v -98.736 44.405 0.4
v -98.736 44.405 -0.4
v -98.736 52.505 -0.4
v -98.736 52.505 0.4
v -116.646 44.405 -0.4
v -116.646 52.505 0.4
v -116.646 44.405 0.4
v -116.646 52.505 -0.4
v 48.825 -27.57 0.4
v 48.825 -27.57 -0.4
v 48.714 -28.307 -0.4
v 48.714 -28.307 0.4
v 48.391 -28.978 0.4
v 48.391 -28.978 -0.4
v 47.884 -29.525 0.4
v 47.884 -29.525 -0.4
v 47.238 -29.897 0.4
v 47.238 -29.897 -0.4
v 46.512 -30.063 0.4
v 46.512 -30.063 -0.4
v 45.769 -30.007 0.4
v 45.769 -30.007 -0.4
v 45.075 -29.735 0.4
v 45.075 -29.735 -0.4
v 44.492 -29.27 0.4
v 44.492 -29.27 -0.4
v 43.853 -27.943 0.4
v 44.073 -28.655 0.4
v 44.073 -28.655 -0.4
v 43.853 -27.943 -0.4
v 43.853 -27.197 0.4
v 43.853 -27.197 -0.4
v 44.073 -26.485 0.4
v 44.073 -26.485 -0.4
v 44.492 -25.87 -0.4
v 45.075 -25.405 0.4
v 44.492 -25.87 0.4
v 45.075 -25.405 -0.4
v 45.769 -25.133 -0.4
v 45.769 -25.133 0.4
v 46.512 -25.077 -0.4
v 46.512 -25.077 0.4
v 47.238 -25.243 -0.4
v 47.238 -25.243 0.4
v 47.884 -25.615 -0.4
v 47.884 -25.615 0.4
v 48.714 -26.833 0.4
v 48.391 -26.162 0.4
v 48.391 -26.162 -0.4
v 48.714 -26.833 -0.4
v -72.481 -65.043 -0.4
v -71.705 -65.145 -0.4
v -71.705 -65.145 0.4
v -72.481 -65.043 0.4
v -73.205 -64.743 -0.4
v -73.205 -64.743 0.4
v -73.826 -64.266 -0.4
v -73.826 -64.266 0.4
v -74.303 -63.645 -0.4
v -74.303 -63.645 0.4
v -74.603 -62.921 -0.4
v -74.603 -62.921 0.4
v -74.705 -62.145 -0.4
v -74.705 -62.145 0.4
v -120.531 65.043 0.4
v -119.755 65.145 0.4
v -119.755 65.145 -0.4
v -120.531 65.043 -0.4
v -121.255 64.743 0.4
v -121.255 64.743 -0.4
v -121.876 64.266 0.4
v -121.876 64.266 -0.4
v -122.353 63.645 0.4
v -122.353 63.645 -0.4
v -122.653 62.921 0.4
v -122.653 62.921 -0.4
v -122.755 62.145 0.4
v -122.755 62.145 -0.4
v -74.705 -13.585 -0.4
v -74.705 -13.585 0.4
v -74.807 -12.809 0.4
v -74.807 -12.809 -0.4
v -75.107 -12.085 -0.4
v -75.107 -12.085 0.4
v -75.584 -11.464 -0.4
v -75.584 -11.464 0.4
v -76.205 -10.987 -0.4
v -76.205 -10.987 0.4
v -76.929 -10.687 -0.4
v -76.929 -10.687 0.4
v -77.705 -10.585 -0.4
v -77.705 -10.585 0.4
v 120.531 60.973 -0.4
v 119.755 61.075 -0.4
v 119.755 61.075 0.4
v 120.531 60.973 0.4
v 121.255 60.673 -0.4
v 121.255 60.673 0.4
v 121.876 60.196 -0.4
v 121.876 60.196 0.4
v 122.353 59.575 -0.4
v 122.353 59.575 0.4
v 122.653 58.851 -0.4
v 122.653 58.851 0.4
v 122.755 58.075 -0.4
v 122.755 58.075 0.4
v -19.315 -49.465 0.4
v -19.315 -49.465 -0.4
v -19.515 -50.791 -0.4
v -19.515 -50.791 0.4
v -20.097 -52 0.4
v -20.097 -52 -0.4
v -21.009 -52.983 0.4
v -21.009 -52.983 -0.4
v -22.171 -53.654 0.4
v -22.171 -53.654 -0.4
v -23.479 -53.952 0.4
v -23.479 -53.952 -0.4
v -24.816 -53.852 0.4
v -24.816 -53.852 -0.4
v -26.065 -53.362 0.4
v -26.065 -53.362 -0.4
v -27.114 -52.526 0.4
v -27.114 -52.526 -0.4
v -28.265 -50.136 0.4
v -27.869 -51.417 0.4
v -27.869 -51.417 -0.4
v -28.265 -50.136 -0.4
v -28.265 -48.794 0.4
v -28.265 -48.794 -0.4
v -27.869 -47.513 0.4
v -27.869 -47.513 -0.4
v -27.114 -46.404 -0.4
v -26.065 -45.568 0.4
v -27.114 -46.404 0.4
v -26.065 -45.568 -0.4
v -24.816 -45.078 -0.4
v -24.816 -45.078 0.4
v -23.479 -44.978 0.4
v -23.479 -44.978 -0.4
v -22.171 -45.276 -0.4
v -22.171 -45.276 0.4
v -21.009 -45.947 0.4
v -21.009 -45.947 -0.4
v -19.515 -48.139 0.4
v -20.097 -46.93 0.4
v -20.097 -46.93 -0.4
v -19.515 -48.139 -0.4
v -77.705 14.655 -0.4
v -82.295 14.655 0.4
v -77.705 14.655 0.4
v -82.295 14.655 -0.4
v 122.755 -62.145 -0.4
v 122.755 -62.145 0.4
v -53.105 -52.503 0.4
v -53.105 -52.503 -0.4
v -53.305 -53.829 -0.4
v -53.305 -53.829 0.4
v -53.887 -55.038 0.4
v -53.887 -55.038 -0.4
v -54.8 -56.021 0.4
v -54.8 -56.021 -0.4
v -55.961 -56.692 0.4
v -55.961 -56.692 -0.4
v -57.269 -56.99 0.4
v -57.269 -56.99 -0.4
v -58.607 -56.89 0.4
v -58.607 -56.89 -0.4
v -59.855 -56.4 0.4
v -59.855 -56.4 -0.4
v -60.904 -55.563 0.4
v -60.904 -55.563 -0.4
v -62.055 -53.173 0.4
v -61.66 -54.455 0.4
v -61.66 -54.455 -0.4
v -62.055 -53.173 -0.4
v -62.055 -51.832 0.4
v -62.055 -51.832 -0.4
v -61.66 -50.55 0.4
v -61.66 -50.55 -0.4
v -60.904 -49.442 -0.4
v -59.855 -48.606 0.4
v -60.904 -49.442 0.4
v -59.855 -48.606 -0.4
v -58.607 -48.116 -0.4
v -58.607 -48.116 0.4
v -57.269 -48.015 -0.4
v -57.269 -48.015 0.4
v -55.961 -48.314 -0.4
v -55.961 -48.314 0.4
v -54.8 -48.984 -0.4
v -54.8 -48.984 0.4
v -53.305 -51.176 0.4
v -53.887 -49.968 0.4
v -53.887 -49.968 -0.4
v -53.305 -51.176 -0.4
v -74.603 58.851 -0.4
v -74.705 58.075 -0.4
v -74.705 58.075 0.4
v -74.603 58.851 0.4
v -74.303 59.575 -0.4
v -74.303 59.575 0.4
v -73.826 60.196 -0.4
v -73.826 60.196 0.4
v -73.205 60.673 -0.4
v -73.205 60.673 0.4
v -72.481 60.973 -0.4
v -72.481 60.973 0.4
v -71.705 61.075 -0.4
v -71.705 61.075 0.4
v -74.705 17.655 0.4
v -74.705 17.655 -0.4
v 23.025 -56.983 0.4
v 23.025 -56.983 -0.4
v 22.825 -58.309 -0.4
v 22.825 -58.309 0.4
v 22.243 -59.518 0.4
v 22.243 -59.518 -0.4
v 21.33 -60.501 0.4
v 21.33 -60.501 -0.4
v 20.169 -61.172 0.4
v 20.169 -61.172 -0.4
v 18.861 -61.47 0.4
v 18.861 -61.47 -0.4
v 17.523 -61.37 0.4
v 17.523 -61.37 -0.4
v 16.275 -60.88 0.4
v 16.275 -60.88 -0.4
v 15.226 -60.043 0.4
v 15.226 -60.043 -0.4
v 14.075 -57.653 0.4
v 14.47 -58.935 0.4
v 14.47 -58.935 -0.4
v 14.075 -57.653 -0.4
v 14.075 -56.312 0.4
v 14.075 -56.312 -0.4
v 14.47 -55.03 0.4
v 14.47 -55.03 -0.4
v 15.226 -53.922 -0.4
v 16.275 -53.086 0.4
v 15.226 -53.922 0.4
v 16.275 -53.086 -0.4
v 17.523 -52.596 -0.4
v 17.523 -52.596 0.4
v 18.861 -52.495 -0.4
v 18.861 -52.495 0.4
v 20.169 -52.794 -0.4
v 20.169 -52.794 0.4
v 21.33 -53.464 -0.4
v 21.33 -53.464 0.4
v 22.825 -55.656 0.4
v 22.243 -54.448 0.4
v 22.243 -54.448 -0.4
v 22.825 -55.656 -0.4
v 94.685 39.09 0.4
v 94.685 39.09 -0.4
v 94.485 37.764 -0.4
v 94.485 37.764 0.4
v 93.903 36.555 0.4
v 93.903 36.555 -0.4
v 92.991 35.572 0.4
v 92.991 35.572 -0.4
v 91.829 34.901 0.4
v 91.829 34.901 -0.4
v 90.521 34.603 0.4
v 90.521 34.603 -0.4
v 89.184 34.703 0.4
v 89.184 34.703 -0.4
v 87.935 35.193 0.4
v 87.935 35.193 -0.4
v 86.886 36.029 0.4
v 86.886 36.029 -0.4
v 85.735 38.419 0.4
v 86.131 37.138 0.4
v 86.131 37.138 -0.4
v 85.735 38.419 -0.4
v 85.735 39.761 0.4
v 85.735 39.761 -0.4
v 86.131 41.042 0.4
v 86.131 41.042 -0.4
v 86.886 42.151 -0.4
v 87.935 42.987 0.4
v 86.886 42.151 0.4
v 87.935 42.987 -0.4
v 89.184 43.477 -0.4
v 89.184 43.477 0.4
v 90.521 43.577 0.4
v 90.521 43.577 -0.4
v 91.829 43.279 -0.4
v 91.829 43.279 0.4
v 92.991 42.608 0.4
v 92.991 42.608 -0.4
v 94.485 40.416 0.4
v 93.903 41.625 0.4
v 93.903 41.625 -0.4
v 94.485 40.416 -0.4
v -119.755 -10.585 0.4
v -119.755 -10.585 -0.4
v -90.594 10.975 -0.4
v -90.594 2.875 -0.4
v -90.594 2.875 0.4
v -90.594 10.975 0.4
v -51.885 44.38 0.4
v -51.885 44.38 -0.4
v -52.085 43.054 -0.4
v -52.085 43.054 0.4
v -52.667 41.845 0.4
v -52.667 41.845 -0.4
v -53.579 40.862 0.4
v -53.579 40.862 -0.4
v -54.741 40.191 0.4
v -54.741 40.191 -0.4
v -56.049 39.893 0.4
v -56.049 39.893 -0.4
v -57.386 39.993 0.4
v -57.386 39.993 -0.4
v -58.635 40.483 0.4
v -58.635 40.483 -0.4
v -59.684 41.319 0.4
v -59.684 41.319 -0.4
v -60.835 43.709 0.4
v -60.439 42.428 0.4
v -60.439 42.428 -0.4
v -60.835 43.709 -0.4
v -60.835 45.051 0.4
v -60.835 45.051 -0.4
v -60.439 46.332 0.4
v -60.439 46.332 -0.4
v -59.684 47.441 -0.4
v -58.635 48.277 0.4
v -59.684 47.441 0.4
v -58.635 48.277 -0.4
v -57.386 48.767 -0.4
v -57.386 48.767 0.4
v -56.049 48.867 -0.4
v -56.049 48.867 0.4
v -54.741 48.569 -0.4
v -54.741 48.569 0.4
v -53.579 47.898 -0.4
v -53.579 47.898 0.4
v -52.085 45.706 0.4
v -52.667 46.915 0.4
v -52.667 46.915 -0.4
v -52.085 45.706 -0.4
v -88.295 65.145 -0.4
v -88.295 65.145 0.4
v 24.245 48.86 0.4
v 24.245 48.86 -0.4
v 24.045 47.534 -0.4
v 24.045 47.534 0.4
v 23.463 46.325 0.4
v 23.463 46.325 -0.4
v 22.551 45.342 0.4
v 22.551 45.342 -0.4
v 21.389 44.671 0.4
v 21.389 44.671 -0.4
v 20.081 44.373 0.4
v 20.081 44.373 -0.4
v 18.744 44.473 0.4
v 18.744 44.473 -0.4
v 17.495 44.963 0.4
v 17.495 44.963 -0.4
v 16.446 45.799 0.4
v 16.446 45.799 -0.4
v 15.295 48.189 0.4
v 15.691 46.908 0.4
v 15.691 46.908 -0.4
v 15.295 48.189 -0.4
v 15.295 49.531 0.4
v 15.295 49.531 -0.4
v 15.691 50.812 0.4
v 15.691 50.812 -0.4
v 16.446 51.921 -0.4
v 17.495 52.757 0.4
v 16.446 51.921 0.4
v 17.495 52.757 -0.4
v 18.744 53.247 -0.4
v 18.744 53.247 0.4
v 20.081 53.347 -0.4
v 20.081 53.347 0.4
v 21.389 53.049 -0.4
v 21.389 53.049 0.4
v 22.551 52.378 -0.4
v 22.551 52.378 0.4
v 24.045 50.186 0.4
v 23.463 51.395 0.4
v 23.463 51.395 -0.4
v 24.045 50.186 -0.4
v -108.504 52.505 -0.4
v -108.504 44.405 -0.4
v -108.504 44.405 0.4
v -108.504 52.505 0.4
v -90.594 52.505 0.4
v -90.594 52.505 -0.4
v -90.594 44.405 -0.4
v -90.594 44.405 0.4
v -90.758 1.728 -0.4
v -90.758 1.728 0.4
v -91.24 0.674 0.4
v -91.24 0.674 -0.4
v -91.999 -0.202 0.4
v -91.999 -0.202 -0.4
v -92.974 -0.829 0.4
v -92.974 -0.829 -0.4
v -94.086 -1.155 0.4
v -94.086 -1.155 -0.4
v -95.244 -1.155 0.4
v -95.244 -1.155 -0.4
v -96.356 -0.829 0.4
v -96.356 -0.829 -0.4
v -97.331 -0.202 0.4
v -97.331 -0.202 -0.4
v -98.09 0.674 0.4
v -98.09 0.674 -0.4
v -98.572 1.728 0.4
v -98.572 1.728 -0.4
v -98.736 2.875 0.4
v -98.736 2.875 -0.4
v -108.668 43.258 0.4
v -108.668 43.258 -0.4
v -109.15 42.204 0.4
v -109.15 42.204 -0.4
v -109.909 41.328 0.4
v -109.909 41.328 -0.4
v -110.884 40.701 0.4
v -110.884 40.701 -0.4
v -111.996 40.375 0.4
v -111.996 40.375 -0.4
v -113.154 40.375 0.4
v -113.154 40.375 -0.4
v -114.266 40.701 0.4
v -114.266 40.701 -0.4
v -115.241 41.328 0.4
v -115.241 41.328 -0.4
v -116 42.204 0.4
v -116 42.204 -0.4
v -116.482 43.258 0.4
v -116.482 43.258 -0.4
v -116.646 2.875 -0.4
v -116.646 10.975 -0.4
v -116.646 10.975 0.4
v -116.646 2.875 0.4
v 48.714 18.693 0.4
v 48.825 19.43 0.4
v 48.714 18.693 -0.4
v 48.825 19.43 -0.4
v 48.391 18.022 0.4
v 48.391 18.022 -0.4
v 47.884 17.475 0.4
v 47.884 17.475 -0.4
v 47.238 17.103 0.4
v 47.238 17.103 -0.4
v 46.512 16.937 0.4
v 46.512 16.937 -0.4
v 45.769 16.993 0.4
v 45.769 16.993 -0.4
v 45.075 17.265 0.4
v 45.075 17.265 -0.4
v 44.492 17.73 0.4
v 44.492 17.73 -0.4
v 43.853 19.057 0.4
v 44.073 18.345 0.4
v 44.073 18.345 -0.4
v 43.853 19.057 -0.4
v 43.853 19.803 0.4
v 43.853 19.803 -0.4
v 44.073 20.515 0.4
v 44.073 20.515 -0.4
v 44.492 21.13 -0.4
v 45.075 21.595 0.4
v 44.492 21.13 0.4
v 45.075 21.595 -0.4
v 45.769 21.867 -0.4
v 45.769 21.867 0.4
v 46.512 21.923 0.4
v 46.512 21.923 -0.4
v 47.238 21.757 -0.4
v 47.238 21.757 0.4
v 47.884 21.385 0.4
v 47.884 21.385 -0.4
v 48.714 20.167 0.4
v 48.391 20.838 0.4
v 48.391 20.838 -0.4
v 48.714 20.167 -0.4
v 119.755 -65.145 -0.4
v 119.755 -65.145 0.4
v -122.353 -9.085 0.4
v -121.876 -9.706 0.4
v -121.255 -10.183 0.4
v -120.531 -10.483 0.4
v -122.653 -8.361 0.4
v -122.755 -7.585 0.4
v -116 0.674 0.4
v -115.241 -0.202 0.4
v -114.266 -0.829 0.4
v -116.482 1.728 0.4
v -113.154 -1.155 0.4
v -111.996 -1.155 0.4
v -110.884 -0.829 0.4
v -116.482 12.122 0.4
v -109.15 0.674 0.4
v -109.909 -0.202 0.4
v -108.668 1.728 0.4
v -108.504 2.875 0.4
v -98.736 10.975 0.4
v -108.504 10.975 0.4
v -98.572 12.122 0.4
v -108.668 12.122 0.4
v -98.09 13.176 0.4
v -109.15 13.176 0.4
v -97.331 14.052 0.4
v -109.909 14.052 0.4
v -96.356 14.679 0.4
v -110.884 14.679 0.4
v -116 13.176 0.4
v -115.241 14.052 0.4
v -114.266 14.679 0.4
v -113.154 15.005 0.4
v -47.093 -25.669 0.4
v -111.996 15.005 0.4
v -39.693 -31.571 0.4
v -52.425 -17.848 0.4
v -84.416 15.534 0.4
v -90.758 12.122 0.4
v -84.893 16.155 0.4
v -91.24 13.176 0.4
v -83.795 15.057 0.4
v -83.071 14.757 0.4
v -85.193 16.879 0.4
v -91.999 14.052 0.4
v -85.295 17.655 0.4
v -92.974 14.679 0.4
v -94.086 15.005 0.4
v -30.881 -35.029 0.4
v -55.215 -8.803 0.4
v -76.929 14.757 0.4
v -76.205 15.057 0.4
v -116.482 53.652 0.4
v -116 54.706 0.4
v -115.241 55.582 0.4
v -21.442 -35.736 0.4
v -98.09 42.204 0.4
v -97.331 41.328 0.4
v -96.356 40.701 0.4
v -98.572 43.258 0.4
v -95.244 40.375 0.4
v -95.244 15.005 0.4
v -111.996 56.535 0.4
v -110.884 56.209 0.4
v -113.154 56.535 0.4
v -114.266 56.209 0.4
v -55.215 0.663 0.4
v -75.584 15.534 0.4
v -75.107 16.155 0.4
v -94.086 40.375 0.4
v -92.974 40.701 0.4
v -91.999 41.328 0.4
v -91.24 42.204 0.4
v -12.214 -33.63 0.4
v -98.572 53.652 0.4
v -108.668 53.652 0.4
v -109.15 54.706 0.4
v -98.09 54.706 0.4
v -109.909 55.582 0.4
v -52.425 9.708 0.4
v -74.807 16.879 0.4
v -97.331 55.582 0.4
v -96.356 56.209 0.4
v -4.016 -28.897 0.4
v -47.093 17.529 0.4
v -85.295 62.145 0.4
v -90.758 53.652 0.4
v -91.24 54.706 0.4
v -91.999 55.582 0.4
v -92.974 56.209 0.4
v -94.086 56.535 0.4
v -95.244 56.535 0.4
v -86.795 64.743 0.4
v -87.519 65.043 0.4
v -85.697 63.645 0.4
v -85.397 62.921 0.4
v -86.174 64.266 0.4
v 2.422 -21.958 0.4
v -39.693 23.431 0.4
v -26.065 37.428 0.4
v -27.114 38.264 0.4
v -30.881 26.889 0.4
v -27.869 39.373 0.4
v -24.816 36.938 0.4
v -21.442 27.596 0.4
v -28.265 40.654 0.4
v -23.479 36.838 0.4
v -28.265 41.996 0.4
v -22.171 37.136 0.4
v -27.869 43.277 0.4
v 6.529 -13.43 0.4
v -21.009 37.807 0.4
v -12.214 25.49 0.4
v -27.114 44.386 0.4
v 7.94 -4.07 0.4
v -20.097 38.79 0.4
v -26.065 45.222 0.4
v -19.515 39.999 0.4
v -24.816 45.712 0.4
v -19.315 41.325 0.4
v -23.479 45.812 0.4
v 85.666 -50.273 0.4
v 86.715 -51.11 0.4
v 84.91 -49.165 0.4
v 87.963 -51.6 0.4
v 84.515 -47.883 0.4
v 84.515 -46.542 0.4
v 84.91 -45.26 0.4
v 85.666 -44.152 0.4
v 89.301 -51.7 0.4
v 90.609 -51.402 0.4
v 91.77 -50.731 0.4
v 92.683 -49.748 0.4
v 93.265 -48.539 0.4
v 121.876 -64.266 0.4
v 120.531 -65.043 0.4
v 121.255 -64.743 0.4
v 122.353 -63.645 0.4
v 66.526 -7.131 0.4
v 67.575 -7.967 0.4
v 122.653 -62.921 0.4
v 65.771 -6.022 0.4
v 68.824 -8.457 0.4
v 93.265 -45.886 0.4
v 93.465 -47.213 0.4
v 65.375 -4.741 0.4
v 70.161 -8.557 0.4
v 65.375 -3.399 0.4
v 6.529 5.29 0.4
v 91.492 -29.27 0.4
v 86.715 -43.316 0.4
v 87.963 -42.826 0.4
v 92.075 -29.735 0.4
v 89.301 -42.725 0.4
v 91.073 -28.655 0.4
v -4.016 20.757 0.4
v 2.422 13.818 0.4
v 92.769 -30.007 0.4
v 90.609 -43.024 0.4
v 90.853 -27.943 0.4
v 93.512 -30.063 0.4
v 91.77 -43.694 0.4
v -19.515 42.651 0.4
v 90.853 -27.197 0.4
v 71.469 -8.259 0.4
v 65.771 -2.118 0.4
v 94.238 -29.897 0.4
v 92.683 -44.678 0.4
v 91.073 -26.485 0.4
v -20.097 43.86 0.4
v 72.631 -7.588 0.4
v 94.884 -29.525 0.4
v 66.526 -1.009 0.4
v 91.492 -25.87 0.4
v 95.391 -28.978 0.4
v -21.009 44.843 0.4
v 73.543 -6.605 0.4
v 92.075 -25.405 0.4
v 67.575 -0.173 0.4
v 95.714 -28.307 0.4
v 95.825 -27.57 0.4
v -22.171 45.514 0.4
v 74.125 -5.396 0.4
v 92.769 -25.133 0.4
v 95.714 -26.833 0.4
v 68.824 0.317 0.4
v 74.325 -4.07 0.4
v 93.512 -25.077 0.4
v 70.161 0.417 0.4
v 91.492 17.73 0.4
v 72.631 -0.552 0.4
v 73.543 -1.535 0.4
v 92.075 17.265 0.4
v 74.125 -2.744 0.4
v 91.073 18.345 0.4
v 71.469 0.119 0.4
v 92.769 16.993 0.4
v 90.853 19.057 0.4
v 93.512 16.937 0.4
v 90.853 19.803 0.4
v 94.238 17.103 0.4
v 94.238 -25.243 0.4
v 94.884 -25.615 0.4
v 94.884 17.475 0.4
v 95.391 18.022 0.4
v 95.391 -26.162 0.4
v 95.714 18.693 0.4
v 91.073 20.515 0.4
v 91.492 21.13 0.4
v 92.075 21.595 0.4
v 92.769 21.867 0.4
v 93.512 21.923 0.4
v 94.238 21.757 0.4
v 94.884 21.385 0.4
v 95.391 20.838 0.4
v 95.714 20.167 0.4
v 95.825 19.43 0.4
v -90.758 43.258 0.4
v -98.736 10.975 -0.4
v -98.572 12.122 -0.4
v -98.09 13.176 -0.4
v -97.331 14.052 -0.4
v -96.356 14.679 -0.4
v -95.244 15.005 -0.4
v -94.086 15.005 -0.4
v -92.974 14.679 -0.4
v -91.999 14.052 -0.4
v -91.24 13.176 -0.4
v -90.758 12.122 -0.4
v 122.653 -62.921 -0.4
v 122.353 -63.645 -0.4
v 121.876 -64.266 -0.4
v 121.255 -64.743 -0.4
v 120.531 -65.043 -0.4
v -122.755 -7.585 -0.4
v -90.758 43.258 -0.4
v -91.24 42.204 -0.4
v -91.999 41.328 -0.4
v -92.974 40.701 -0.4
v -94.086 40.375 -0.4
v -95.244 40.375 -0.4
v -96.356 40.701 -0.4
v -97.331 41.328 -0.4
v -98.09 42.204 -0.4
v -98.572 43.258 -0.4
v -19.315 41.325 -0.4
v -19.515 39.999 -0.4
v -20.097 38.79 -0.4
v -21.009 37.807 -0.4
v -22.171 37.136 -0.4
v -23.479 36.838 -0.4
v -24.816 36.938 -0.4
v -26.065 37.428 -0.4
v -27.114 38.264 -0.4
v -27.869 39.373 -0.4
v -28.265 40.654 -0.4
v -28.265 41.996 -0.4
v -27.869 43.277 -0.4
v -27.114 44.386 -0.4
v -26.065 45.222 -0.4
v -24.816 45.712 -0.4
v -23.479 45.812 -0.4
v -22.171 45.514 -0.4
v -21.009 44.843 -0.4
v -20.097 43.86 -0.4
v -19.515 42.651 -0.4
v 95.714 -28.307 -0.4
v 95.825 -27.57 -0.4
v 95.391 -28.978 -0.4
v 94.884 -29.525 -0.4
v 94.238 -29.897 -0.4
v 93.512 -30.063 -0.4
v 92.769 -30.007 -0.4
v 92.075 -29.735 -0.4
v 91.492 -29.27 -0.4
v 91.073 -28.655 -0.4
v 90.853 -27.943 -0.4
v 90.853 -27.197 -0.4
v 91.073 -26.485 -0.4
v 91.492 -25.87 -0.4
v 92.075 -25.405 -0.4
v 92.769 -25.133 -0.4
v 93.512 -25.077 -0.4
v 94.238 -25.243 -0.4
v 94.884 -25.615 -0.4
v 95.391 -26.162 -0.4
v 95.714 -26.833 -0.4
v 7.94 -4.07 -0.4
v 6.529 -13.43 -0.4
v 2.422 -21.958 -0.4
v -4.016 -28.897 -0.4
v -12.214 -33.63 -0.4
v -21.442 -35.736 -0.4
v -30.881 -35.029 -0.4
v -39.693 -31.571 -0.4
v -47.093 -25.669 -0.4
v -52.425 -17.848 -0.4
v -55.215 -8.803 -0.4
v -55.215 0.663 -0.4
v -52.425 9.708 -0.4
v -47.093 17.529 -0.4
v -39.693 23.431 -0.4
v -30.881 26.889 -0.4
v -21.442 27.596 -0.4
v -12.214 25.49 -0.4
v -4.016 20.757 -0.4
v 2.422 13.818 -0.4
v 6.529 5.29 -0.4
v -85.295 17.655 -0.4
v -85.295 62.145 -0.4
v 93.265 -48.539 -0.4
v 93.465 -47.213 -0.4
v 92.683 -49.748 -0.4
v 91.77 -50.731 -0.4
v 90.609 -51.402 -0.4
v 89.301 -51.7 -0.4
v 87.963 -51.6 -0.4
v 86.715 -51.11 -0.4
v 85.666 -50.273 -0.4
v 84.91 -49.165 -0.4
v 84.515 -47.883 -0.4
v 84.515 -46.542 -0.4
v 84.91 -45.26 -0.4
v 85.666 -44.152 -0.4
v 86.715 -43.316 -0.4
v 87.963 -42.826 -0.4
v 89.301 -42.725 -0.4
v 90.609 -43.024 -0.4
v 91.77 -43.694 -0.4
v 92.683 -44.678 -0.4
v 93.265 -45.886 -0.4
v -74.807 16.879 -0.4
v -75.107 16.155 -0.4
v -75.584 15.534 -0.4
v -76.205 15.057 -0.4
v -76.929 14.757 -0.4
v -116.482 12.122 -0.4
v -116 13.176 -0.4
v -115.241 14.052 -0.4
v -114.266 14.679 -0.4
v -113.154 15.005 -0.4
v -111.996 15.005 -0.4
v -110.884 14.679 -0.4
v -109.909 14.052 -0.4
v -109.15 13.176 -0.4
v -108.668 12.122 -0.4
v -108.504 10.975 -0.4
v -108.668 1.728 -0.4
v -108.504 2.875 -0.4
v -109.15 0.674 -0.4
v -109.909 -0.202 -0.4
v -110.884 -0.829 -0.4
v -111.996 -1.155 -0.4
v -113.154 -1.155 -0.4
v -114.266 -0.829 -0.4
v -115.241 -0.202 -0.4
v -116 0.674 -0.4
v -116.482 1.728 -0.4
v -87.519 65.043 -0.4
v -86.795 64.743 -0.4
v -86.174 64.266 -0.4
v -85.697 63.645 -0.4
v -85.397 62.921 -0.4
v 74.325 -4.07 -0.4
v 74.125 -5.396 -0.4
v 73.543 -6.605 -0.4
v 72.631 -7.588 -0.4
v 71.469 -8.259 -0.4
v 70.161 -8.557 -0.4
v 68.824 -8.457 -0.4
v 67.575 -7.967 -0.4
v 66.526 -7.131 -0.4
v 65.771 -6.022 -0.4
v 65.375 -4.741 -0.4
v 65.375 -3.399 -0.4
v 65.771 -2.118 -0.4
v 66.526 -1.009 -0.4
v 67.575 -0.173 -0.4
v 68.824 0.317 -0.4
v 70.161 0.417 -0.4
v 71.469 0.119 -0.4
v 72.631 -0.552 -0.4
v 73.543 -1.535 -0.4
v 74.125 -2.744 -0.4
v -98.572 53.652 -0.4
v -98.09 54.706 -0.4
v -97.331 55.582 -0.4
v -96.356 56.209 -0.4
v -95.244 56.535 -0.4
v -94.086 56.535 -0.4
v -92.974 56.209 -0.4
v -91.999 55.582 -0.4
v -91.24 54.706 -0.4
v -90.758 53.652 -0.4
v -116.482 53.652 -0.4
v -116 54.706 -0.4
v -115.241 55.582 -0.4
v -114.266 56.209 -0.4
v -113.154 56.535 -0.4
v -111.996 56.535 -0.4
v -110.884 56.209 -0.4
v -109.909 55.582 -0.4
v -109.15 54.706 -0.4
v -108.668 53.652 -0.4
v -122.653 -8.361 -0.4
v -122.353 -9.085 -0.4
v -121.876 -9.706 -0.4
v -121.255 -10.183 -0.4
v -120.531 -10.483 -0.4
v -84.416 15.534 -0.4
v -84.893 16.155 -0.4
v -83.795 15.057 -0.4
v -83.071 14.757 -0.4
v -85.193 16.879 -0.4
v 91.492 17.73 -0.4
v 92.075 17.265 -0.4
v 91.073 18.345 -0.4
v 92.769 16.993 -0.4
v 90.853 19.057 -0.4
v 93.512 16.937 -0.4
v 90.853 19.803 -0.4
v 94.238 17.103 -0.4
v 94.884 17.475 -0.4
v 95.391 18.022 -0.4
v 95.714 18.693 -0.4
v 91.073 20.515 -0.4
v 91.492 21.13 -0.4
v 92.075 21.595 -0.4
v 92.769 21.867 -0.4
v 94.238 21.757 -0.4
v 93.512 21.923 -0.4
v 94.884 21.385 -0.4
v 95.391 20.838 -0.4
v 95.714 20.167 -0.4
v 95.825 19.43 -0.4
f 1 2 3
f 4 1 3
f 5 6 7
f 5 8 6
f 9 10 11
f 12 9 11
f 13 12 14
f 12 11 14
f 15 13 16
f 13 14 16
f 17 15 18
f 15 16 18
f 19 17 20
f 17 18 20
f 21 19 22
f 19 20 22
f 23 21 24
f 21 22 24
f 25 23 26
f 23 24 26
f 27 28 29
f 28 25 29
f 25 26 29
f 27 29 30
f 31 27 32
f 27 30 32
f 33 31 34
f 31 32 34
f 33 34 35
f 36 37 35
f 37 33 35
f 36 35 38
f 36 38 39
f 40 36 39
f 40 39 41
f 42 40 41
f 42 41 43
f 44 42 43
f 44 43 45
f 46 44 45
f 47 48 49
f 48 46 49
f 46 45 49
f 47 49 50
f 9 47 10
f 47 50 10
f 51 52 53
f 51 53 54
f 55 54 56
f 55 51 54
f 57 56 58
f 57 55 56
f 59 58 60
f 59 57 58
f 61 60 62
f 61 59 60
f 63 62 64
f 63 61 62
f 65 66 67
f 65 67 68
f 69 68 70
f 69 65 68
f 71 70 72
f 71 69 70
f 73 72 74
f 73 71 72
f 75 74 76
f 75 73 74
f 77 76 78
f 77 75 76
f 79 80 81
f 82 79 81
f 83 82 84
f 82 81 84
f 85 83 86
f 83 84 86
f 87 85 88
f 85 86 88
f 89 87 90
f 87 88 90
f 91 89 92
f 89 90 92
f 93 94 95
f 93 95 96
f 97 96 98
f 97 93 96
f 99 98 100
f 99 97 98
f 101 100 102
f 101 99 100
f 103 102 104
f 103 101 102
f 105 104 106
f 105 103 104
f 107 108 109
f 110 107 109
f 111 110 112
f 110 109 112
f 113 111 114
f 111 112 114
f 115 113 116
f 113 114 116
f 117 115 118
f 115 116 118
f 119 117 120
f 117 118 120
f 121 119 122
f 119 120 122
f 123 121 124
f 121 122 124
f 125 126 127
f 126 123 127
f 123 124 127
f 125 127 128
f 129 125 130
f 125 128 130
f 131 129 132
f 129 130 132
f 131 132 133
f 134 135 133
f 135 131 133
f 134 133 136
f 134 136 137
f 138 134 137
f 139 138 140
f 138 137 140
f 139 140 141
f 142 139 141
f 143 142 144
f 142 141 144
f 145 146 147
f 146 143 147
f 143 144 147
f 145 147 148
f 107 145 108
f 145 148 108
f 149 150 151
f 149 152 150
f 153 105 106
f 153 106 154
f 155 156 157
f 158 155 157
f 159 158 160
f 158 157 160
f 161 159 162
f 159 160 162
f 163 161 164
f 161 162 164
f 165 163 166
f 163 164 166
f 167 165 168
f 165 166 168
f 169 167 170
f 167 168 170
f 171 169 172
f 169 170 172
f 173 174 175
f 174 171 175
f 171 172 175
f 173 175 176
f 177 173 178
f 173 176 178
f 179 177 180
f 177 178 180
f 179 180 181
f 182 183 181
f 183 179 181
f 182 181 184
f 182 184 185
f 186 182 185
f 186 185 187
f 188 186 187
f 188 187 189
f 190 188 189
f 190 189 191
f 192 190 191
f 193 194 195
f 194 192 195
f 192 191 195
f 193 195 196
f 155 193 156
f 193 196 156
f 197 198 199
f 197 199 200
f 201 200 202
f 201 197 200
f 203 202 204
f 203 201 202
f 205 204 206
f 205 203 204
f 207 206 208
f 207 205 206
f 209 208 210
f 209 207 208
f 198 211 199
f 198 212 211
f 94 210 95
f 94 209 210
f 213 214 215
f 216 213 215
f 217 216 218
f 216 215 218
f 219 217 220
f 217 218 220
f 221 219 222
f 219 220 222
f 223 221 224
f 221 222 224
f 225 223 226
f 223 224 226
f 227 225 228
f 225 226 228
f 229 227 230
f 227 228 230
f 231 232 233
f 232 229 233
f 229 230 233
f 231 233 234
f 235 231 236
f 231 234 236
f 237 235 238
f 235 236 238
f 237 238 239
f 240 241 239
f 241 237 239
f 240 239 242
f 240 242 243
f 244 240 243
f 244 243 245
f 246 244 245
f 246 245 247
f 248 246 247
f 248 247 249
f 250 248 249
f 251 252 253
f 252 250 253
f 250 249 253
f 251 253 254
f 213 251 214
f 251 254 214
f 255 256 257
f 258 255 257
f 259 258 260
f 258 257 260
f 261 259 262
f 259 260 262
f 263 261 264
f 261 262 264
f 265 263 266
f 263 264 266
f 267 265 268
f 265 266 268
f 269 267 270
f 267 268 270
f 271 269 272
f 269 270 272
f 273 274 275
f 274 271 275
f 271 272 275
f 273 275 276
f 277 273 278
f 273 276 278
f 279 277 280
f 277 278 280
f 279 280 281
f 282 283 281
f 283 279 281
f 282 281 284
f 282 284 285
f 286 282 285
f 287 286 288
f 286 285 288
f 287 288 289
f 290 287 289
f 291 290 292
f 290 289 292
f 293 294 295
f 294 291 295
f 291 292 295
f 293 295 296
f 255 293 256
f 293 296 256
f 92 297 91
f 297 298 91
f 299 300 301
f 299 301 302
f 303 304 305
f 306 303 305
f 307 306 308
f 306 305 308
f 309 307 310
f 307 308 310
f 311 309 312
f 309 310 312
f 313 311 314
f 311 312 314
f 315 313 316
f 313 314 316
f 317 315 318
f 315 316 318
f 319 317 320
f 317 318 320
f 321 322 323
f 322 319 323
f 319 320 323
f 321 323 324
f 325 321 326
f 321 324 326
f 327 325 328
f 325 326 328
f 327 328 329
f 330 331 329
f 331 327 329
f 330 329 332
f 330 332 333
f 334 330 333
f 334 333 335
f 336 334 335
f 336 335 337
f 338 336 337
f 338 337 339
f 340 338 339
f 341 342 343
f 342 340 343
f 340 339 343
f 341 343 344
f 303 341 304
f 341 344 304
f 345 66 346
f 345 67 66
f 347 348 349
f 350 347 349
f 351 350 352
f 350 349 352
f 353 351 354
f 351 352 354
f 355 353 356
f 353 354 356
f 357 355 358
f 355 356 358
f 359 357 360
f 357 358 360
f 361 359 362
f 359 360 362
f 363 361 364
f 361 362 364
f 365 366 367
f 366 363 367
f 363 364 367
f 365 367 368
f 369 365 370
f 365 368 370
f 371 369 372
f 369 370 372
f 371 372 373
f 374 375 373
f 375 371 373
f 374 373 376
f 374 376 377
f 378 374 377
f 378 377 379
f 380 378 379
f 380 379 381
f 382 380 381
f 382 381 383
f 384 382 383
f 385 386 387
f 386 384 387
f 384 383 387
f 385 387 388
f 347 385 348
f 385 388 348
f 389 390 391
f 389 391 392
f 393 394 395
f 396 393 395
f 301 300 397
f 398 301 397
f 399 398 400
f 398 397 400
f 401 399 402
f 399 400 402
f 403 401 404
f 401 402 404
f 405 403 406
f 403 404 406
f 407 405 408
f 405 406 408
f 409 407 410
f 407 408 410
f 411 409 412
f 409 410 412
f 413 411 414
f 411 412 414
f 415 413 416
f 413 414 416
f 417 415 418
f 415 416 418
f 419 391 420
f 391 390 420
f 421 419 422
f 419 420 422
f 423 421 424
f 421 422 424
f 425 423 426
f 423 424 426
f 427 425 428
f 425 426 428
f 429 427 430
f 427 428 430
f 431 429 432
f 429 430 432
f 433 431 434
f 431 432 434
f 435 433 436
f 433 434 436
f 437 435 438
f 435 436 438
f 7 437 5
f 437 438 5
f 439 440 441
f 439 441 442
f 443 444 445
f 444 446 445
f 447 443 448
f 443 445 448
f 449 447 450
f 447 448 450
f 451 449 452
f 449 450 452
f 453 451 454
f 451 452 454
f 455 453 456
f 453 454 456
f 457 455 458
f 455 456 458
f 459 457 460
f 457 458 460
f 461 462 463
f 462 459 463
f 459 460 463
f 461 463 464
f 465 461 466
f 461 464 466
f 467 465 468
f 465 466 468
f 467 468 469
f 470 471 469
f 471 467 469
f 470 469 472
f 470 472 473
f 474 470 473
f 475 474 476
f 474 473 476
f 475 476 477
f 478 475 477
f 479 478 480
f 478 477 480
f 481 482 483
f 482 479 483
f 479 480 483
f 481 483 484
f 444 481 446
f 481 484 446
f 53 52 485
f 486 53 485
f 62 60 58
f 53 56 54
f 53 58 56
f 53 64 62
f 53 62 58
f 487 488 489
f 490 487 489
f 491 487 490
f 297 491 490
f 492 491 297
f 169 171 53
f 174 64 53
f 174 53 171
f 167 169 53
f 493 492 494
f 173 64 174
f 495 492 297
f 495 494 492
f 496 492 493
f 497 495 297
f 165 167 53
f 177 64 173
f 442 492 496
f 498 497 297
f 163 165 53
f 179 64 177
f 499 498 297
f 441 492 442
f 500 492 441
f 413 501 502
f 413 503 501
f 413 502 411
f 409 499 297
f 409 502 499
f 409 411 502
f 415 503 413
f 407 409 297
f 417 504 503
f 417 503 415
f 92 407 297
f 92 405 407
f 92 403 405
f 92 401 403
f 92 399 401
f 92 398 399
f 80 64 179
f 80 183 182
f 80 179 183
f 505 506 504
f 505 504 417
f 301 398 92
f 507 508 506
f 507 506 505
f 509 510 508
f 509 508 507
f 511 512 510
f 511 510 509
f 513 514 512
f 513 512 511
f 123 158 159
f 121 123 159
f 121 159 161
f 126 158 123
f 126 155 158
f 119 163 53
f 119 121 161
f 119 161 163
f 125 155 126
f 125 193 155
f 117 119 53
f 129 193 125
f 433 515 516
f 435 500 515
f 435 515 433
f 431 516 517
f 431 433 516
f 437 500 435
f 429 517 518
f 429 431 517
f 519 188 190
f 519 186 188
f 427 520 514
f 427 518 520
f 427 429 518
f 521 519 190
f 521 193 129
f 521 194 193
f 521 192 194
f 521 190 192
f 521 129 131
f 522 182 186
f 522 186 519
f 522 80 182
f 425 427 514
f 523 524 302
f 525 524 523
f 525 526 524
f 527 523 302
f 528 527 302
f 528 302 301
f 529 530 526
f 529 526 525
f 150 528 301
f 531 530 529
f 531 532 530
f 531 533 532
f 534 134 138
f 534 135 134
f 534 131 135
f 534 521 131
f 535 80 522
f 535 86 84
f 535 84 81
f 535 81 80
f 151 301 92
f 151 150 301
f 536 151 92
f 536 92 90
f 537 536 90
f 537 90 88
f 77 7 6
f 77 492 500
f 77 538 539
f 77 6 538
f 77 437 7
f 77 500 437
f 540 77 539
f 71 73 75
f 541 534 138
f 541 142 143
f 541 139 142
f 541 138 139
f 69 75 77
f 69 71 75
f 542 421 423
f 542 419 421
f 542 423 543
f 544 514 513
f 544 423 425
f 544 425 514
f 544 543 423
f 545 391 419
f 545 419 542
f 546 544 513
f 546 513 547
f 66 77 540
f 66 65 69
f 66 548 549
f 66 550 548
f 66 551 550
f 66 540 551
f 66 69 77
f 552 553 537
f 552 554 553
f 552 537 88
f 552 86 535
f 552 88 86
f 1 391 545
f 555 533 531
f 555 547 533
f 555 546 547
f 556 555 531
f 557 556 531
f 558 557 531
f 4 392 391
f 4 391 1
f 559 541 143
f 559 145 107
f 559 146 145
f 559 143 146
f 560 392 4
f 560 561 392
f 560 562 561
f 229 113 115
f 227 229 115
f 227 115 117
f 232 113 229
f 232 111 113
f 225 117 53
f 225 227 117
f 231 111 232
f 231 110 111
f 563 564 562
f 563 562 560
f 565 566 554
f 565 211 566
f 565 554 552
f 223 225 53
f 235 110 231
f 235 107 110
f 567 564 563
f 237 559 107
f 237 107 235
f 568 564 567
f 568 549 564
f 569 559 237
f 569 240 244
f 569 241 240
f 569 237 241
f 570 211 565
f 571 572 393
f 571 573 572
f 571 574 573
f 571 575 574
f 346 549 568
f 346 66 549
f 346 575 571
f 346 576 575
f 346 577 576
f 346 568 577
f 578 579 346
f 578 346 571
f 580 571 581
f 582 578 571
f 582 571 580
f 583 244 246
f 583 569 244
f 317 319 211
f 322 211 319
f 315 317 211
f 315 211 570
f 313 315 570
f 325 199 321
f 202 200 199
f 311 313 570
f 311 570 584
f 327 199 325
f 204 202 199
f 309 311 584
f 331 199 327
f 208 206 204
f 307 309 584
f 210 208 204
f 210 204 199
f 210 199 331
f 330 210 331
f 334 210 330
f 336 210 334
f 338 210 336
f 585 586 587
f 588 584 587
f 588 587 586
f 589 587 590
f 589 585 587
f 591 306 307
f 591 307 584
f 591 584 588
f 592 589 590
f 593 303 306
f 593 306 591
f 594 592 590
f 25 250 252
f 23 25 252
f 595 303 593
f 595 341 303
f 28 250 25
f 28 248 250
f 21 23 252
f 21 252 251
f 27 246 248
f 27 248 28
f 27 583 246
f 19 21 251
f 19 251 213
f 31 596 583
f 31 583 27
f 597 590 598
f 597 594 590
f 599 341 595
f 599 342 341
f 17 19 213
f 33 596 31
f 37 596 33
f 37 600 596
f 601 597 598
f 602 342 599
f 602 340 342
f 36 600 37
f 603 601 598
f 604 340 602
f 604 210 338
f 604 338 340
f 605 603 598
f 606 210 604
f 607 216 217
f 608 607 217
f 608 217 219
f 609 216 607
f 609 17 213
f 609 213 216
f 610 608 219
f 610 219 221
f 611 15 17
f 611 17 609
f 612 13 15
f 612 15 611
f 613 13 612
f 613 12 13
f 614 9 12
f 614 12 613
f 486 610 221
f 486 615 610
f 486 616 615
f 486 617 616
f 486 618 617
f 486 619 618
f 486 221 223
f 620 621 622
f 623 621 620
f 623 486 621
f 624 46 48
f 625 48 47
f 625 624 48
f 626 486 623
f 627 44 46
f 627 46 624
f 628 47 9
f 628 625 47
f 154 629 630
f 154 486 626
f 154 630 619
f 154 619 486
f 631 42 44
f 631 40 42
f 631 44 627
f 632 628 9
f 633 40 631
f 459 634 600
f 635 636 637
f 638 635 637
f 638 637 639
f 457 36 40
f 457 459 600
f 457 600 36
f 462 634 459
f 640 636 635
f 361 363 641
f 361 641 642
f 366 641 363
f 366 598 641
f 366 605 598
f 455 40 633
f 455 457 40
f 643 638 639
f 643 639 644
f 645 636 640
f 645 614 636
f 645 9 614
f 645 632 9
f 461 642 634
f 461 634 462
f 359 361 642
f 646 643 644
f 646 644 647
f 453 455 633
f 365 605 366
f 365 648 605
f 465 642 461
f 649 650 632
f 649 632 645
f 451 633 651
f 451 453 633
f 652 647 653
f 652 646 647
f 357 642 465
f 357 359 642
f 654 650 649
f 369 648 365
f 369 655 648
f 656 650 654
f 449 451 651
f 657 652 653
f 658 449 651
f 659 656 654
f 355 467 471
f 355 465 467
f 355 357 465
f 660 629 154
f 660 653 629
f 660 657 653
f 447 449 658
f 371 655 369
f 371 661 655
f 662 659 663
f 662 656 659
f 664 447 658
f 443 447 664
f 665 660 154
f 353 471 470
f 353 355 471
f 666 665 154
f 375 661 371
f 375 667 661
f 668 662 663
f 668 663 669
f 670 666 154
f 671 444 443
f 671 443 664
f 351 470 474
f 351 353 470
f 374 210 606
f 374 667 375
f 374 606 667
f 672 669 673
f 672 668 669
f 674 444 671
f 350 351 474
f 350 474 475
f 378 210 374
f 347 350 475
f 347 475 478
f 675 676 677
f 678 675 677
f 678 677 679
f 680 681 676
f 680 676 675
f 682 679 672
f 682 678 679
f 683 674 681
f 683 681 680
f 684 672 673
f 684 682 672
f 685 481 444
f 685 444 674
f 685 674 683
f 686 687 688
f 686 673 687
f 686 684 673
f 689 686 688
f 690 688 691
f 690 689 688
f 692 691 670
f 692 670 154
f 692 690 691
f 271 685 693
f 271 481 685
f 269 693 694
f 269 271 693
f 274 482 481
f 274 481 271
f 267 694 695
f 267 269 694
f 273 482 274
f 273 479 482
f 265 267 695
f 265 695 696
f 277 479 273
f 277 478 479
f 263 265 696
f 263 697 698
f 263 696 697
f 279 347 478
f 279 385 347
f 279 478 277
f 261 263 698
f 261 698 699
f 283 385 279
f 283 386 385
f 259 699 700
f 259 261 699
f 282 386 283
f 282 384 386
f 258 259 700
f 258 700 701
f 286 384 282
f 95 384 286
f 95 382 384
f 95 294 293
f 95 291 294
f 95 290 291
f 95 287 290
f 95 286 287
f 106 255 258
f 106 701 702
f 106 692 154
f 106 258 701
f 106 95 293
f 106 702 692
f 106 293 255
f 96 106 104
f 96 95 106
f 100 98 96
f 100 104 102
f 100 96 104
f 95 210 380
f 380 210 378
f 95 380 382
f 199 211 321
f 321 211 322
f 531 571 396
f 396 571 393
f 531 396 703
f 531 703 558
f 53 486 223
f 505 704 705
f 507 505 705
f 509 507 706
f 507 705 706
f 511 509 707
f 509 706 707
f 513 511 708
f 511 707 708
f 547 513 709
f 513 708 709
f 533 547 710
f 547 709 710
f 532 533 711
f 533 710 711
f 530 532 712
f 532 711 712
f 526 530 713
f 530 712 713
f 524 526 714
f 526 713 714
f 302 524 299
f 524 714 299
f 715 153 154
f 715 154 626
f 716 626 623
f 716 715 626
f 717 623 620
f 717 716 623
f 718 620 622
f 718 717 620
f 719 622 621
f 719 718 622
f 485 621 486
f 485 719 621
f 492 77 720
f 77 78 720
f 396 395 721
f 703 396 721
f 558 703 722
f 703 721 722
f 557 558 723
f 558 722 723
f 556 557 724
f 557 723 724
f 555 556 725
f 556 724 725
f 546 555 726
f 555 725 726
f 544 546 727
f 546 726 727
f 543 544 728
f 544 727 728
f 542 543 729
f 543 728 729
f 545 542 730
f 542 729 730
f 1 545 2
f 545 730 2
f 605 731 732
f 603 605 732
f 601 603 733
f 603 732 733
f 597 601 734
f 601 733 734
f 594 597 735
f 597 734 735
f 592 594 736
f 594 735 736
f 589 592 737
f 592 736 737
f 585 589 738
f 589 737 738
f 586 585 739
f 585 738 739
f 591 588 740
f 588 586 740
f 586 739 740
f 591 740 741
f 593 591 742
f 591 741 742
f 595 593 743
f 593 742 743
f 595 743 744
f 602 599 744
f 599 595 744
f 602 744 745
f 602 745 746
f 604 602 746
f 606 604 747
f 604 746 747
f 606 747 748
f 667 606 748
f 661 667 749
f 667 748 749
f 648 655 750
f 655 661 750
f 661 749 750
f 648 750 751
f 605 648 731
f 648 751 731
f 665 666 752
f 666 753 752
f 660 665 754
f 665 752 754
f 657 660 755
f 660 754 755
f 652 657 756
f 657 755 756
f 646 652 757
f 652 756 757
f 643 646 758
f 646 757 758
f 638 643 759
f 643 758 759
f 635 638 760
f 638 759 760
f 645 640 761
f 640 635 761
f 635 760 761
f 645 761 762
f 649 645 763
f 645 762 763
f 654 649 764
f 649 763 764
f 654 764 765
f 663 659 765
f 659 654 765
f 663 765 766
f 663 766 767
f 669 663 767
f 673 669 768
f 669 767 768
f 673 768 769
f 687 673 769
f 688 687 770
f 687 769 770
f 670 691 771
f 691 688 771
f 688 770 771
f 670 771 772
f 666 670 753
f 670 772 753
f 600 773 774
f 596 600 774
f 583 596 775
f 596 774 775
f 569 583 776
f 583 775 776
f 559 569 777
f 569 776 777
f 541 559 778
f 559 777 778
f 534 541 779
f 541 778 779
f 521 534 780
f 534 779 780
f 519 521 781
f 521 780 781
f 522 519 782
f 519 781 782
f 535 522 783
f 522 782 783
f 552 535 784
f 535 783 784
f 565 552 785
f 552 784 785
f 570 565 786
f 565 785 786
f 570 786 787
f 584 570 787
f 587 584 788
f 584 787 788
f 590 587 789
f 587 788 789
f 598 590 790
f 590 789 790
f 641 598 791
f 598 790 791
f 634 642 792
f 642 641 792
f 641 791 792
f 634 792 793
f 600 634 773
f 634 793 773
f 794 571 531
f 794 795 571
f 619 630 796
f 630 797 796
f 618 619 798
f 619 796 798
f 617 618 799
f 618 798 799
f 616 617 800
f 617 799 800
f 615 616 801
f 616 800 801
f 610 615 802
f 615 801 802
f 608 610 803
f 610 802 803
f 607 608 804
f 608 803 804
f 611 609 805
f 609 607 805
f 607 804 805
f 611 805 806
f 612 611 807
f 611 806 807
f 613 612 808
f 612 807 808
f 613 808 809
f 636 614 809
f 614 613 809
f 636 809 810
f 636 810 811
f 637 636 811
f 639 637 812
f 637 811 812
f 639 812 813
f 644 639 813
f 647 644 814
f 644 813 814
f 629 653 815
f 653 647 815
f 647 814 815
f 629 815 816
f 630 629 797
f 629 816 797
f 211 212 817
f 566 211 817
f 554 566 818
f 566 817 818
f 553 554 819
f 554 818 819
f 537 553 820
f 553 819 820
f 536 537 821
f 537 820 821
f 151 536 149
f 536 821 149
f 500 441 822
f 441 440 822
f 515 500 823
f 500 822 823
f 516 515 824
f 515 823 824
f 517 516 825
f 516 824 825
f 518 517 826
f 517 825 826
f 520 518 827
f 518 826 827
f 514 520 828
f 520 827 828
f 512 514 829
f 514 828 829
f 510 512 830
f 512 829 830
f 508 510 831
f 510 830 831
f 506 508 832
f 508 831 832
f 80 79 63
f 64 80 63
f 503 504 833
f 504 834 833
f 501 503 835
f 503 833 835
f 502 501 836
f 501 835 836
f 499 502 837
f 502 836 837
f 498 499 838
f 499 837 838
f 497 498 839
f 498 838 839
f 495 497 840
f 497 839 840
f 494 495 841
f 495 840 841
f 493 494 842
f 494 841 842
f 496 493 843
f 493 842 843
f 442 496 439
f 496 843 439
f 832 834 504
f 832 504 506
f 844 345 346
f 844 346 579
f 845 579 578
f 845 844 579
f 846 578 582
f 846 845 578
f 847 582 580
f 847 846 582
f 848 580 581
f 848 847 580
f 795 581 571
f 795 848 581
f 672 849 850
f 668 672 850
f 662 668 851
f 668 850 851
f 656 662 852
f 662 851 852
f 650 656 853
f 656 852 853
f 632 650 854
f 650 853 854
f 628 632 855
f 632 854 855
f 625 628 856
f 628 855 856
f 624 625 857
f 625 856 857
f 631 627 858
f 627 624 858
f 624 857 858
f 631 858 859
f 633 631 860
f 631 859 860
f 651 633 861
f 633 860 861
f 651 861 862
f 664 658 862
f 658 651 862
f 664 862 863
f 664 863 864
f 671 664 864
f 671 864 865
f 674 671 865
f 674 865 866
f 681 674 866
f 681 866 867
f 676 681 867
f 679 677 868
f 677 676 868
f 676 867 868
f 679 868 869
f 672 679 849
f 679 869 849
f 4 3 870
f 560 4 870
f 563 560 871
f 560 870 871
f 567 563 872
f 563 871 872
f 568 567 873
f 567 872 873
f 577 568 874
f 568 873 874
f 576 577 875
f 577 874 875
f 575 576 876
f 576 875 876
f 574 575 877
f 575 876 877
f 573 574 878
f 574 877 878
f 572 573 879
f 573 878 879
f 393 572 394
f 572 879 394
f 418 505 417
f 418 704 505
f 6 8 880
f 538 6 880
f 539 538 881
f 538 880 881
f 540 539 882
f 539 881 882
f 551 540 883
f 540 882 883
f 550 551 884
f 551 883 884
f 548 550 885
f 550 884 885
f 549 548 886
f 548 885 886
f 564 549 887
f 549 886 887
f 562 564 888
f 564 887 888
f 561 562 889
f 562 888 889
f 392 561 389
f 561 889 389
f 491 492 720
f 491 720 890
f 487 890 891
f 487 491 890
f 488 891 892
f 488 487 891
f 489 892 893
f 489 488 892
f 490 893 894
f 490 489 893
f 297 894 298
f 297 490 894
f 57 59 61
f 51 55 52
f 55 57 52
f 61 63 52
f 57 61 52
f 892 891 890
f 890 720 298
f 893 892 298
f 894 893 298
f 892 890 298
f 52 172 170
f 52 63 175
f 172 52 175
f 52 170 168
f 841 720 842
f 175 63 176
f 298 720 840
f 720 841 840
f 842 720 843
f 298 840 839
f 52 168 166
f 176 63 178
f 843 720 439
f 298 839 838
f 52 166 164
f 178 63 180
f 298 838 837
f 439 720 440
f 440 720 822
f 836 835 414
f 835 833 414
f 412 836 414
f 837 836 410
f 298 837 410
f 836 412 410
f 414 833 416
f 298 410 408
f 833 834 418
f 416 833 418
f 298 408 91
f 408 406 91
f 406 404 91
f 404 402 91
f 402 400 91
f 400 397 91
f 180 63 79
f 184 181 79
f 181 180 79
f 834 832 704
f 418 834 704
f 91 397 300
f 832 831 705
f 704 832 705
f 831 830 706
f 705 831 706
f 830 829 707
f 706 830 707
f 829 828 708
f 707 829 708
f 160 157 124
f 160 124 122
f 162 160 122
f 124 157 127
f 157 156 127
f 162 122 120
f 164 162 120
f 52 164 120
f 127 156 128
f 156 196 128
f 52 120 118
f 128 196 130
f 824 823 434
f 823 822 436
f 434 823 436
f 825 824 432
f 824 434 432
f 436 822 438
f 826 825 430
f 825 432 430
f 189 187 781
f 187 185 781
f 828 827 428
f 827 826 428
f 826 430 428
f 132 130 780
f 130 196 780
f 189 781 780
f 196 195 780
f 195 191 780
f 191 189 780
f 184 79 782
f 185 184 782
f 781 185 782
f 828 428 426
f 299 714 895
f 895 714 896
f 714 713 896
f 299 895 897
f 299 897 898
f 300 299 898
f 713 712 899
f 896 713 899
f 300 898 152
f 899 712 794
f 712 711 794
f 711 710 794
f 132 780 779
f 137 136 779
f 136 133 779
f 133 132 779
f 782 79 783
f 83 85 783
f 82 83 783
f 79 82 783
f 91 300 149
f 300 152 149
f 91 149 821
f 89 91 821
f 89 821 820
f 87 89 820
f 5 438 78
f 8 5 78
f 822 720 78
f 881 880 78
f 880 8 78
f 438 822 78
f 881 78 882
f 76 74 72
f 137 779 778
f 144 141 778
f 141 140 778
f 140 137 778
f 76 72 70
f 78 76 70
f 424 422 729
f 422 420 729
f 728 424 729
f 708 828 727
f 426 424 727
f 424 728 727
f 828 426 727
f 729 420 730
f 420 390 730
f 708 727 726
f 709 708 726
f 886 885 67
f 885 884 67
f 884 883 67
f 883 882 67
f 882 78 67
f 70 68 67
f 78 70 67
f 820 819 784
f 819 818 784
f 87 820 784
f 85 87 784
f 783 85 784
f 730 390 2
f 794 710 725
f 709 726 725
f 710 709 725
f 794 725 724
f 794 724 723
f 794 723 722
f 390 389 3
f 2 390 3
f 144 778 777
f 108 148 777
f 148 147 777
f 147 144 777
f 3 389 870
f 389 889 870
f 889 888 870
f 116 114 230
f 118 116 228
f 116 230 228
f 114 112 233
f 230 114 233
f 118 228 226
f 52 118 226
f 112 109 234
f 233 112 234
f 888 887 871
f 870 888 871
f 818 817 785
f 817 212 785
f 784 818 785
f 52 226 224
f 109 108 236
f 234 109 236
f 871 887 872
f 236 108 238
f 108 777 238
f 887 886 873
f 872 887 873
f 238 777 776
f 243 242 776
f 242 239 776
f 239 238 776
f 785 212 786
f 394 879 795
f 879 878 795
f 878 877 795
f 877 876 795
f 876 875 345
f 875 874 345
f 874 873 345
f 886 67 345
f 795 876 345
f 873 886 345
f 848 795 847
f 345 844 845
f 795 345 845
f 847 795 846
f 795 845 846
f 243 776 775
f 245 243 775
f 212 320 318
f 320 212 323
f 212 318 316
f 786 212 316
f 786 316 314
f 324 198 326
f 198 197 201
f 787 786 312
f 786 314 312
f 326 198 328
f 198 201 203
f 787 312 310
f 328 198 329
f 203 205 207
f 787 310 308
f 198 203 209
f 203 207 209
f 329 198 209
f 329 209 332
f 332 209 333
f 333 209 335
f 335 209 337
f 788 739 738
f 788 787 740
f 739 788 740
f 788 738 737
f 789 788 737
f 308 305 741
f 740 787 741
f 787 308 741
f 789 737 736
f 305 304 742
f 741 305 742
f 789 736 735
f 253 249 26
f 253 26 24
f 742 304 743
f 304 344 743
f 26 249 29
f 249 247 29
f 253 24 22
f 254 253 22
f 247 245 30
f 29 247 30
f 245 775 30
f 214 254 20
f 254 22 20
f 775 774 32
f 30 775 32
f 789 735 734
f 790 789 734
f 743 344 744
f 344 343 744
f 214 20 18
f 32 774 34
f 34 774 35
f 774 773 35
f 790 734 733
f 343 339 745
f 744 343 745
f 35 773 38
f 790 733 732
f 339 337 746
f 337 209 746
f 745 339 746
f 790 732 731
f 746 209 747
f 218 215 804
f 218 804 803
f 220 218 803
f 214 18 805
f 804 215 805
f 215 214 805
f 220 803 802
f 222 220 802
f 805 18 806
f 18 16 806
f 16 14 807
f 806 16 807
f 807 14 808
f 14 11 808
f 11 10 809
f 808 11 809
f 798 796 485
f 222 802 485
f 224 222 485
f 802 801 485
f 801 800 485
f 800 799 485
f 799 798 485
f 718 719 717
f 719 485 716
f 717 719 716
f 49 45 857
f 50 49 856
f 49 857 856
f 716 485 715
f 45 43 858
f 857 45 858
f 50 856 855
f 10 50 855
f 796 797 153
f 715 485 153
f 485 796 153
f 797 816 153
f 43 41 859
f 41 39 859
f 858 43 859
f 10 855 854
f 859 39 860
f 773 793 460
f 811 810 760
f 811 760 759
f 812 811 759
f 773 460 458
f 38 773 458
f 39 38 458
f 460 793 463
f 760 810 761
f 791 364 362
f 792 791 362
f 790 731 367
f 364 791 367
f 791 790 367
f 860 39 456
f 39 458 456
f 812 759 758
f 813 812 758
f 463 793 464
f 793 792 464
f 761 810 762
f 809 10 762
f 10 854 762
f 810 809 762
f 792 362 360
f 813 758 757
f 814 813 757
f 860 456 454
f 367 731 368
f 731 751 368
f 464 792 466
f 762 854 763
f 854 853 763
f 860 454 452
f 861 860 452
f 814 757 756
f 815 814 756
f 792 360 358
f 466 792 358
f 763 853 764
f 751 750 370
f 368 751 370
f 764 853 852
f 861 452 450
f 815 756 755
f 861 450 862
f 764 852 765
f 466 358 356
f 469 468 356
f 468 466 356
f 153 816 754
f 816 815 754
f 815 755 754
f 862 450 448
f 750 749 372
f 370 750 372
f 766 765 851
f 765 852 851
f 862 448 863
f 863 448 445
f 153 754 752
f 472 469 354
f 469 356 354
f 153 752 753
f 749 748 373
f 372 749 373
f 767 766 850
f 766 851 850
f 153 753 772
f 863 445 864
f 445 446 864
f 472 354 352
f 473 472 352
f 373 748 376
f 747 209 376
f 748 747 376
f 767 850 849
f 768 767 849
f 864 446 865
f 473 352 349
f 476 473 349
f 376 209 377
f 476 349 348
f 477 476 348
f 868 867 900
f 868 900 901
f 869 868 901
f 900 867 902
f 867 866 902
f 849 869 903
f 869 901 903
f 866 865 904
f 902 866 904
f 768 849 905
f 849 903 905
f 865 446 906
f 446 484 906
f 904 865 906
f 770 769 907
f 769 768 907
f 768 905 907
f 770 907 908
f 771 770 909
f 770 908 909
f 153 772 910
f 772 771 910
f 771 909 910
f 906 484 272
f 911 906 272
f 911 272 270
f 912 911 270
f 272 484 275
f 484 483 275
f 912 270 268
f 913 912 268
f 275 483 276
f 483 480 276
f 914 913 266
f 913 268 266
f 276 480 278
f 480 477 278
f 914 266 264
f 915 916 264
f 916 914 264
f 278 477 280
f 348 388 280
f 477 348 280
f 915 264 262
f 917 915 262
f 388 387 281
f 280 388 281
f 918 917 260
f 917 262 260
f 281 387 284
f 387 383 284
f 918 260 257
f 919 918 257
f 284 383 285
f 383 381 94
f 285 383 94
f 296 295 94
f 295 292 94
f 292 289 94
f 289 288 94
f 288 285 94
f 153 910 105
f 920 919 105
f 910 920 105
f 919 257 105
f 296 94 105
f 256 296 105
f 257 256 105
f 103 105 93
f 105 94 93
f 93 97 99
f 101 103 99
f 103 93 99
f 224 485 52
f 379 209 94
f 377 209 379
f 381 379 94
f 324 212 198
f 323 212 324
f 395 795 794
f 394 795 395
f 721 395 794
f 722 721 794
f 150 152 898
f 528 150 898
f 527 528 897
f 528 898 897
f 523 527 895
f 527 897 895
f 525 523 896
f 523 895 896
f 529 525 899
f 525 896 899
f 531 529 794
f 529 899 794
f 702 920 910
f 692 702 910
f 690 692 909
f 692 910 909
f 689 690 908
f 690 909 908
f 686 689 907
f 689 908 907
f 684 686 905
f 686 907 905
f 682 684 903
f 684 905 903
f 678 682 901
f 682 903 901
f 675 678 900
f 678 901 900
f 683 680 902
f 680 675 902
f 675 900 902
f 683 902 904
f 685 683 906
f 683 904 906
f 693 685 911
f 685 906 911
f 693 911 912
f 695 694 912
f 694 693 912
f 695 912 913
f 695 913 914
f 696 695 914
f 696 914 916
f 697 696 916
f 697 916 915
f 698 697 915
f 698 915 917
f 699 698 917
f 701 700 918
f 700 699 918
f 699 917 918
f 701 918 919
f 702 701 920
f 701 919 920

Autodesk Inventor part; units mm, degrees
ref_plane "YZ Plane" through (0, 0, 0) normal (1, 0, 0) x (0, 1, 0)
ref_plane "XZ Plane" through (0, 0, 0) normal (0, 1, 0) x (-1, 0, 0)
ref_plane "XY Plane" through (0, 0, 0) normal (0, 0, 1) x (1, 0, 0)
sketch "Boceto1" plane through (0, 0, 0) normal (0, 0, 1) x (1, 0, 0)
  line L0 (-122.755, 65.145) -> (122.755, -65.145) construction
  line L1 (122.755, 65.145) -> (-122.755, -65.145) construction
  line L2 (-122.755, 65.145) -> (-85.295, 65.145)
  line L3 (-122.755, 65.145) -> (-122.755, -10.585)
  line L4 (-85.295, 65.145) -> (-85.295, 14.655)
  line L5 (-85.295, 14.655) -> (-74.705, 14.655)
  line L6 (-74.705, 14.655) -> (-74.705, 61.075)
  line L7 (-74.705, 61.075) -> (122.755, 61.075)
  line L8 (-122.755, -10.585) -> (-74.705, -10.585)
  line L9 (-74.705, -10.585) -> (-74.705, -65.145)
  line L10 (-74.705, -65.145) -> (122.755, -65.145)
  line L11 (122.755, 61.075) -> (122.755, -65.145)
  line L12 (122.755, 61.075) -> (122.755, -4.07)
  circle A0 centre (93.325, -27.57) radius 2.5
  circle A1 centre (93.325, 19.43) radius 2.5
  circle A2 centre (46.325, 19.43) radius 2.5
  circle A3 centre (46.325, -27.57) radius 2.5
  line L13 (122.755, 61.075) -> (122.755, -4.07)
  line L14 (122.755, 61.075) -> (122.755, -4.07)
  line L15 (122.755, 61.075) -> (122.755, -4.07)
  circle A4 centre (69.825, -4.07) radius 4.5
  circle A5 centre (90.185, 39.09) radius 4.5
  circle A6 centre (88.9646, -47.2127) radius 4.5
  circle A7 centre (19.745, 48.86) radius 4.5
  circle A8 centre (-56.385, 44.38) radius 4.5
  circle A9 centre (-57.6054, -52.5027) radius 4.5
  circle A10 centre (18.5246, -56.9827) radius 4.5
  circle A11 centre (-23.815, 41.325) radius 4.5
  circle A12 centre (-23.815, -49.465) radius 4.5
  circle A13 centre (-23.815, -4.07) radius 31.755
  line L16 (-116.6465, 10.975) -> (-116.6465, 2.875)
  line L17 (-108.5035, 2.875) -> (-108.5035, 10.975)
  arc A14 (-108.5035, 10.975) -> (-116.6465, 10.975) centre (-112.575, 10.975) ccw
  arc A15 (-116.6465, 2.875) -> (-108.5035, 2.875) centre (-112.575, 2.875) ccw
  line L18 (-98.7365, 10.975) -> (-98.7365, 2.875)
  line L19 (-90.5935, 2.875) -> (-90.5935, 10.975)
  arc A16 (-90.5935, 10.975) -> (-98.7365, 10.975) centre (-94.665, 10.975) ccw
  arc A17 (-98.7365, 2.875) -> (-90.5935, 2.875) centre (-94.665, 2.875) ccw
  line L20 (-116.6465, 52.505) -> (-116.6465, 44.405)
  line L21 (-108.5035, 44.405) -> (-108.5035, 52.505)
  line L22 (-90.5935, 52.505) -> (-90.5935, 44.405)
  line L23 (-98.7365, 44.405) -> (-98.7365, 52.505)
  arc A18 (-108.5035, 52.505) -> (-116.6465, 52.505) centre (-112.575, 52.505) ccw
  arc A19 (-116.6465, 44.405) -> (-108.5035, 44.405) centre (-112.575, 44.405) ccw
  arc A20 (-98.7365, 44.405) -> (-90.5935, 44.405) centre (-94.665, 44.405) ccw
  arc A21 (-90.5935, 52.505) -> (-98.7365, 52.505) centre (-94.665, 52.505) ccw
  point P0 (0, 0)
  point P1 (-112.575, 65.145)
  point P2 (-94.665, 65.145)
  dimension "d0" = 245.51
  dimension "d1" = 130.29
  dimension "d2" = 37.46
  dimension "d3" = 75.73
  dimension "d18" = 5
  dimension "d19" = 5
  dimension "d20" = 5
  dimension "d21" = 5
  dimension "d27" = 9
  dimension "d28" = 9
  dimension "d29" = 9
  dimension "d34" = 9
  dimension "d35" = 9
  dimension "d40" = 9
  dimension "d41" = 9
  dimension "d45" = 9
  dimension "d46" = 9
  dimension "d47" = 63.51
extrude "Extrusión2" add sketch "Boceto1" along normal mid plane 0.8
fillet "Empalme2" radius 3 10 edges at (-85.295, 14.655, 0) (-74.705, 14.655, 0) (-85.295, 65.145, 0) (-122.755, 65.145, 0) (-74.705, 61.075, 0) (122.755, 61.075, 0) (122.755, -65.145, 0) (-74.705, -65.145, 0) (-74.705, -10.585, 0) (-122.755, -10.585, 0)
properties part number "piezaaa"
